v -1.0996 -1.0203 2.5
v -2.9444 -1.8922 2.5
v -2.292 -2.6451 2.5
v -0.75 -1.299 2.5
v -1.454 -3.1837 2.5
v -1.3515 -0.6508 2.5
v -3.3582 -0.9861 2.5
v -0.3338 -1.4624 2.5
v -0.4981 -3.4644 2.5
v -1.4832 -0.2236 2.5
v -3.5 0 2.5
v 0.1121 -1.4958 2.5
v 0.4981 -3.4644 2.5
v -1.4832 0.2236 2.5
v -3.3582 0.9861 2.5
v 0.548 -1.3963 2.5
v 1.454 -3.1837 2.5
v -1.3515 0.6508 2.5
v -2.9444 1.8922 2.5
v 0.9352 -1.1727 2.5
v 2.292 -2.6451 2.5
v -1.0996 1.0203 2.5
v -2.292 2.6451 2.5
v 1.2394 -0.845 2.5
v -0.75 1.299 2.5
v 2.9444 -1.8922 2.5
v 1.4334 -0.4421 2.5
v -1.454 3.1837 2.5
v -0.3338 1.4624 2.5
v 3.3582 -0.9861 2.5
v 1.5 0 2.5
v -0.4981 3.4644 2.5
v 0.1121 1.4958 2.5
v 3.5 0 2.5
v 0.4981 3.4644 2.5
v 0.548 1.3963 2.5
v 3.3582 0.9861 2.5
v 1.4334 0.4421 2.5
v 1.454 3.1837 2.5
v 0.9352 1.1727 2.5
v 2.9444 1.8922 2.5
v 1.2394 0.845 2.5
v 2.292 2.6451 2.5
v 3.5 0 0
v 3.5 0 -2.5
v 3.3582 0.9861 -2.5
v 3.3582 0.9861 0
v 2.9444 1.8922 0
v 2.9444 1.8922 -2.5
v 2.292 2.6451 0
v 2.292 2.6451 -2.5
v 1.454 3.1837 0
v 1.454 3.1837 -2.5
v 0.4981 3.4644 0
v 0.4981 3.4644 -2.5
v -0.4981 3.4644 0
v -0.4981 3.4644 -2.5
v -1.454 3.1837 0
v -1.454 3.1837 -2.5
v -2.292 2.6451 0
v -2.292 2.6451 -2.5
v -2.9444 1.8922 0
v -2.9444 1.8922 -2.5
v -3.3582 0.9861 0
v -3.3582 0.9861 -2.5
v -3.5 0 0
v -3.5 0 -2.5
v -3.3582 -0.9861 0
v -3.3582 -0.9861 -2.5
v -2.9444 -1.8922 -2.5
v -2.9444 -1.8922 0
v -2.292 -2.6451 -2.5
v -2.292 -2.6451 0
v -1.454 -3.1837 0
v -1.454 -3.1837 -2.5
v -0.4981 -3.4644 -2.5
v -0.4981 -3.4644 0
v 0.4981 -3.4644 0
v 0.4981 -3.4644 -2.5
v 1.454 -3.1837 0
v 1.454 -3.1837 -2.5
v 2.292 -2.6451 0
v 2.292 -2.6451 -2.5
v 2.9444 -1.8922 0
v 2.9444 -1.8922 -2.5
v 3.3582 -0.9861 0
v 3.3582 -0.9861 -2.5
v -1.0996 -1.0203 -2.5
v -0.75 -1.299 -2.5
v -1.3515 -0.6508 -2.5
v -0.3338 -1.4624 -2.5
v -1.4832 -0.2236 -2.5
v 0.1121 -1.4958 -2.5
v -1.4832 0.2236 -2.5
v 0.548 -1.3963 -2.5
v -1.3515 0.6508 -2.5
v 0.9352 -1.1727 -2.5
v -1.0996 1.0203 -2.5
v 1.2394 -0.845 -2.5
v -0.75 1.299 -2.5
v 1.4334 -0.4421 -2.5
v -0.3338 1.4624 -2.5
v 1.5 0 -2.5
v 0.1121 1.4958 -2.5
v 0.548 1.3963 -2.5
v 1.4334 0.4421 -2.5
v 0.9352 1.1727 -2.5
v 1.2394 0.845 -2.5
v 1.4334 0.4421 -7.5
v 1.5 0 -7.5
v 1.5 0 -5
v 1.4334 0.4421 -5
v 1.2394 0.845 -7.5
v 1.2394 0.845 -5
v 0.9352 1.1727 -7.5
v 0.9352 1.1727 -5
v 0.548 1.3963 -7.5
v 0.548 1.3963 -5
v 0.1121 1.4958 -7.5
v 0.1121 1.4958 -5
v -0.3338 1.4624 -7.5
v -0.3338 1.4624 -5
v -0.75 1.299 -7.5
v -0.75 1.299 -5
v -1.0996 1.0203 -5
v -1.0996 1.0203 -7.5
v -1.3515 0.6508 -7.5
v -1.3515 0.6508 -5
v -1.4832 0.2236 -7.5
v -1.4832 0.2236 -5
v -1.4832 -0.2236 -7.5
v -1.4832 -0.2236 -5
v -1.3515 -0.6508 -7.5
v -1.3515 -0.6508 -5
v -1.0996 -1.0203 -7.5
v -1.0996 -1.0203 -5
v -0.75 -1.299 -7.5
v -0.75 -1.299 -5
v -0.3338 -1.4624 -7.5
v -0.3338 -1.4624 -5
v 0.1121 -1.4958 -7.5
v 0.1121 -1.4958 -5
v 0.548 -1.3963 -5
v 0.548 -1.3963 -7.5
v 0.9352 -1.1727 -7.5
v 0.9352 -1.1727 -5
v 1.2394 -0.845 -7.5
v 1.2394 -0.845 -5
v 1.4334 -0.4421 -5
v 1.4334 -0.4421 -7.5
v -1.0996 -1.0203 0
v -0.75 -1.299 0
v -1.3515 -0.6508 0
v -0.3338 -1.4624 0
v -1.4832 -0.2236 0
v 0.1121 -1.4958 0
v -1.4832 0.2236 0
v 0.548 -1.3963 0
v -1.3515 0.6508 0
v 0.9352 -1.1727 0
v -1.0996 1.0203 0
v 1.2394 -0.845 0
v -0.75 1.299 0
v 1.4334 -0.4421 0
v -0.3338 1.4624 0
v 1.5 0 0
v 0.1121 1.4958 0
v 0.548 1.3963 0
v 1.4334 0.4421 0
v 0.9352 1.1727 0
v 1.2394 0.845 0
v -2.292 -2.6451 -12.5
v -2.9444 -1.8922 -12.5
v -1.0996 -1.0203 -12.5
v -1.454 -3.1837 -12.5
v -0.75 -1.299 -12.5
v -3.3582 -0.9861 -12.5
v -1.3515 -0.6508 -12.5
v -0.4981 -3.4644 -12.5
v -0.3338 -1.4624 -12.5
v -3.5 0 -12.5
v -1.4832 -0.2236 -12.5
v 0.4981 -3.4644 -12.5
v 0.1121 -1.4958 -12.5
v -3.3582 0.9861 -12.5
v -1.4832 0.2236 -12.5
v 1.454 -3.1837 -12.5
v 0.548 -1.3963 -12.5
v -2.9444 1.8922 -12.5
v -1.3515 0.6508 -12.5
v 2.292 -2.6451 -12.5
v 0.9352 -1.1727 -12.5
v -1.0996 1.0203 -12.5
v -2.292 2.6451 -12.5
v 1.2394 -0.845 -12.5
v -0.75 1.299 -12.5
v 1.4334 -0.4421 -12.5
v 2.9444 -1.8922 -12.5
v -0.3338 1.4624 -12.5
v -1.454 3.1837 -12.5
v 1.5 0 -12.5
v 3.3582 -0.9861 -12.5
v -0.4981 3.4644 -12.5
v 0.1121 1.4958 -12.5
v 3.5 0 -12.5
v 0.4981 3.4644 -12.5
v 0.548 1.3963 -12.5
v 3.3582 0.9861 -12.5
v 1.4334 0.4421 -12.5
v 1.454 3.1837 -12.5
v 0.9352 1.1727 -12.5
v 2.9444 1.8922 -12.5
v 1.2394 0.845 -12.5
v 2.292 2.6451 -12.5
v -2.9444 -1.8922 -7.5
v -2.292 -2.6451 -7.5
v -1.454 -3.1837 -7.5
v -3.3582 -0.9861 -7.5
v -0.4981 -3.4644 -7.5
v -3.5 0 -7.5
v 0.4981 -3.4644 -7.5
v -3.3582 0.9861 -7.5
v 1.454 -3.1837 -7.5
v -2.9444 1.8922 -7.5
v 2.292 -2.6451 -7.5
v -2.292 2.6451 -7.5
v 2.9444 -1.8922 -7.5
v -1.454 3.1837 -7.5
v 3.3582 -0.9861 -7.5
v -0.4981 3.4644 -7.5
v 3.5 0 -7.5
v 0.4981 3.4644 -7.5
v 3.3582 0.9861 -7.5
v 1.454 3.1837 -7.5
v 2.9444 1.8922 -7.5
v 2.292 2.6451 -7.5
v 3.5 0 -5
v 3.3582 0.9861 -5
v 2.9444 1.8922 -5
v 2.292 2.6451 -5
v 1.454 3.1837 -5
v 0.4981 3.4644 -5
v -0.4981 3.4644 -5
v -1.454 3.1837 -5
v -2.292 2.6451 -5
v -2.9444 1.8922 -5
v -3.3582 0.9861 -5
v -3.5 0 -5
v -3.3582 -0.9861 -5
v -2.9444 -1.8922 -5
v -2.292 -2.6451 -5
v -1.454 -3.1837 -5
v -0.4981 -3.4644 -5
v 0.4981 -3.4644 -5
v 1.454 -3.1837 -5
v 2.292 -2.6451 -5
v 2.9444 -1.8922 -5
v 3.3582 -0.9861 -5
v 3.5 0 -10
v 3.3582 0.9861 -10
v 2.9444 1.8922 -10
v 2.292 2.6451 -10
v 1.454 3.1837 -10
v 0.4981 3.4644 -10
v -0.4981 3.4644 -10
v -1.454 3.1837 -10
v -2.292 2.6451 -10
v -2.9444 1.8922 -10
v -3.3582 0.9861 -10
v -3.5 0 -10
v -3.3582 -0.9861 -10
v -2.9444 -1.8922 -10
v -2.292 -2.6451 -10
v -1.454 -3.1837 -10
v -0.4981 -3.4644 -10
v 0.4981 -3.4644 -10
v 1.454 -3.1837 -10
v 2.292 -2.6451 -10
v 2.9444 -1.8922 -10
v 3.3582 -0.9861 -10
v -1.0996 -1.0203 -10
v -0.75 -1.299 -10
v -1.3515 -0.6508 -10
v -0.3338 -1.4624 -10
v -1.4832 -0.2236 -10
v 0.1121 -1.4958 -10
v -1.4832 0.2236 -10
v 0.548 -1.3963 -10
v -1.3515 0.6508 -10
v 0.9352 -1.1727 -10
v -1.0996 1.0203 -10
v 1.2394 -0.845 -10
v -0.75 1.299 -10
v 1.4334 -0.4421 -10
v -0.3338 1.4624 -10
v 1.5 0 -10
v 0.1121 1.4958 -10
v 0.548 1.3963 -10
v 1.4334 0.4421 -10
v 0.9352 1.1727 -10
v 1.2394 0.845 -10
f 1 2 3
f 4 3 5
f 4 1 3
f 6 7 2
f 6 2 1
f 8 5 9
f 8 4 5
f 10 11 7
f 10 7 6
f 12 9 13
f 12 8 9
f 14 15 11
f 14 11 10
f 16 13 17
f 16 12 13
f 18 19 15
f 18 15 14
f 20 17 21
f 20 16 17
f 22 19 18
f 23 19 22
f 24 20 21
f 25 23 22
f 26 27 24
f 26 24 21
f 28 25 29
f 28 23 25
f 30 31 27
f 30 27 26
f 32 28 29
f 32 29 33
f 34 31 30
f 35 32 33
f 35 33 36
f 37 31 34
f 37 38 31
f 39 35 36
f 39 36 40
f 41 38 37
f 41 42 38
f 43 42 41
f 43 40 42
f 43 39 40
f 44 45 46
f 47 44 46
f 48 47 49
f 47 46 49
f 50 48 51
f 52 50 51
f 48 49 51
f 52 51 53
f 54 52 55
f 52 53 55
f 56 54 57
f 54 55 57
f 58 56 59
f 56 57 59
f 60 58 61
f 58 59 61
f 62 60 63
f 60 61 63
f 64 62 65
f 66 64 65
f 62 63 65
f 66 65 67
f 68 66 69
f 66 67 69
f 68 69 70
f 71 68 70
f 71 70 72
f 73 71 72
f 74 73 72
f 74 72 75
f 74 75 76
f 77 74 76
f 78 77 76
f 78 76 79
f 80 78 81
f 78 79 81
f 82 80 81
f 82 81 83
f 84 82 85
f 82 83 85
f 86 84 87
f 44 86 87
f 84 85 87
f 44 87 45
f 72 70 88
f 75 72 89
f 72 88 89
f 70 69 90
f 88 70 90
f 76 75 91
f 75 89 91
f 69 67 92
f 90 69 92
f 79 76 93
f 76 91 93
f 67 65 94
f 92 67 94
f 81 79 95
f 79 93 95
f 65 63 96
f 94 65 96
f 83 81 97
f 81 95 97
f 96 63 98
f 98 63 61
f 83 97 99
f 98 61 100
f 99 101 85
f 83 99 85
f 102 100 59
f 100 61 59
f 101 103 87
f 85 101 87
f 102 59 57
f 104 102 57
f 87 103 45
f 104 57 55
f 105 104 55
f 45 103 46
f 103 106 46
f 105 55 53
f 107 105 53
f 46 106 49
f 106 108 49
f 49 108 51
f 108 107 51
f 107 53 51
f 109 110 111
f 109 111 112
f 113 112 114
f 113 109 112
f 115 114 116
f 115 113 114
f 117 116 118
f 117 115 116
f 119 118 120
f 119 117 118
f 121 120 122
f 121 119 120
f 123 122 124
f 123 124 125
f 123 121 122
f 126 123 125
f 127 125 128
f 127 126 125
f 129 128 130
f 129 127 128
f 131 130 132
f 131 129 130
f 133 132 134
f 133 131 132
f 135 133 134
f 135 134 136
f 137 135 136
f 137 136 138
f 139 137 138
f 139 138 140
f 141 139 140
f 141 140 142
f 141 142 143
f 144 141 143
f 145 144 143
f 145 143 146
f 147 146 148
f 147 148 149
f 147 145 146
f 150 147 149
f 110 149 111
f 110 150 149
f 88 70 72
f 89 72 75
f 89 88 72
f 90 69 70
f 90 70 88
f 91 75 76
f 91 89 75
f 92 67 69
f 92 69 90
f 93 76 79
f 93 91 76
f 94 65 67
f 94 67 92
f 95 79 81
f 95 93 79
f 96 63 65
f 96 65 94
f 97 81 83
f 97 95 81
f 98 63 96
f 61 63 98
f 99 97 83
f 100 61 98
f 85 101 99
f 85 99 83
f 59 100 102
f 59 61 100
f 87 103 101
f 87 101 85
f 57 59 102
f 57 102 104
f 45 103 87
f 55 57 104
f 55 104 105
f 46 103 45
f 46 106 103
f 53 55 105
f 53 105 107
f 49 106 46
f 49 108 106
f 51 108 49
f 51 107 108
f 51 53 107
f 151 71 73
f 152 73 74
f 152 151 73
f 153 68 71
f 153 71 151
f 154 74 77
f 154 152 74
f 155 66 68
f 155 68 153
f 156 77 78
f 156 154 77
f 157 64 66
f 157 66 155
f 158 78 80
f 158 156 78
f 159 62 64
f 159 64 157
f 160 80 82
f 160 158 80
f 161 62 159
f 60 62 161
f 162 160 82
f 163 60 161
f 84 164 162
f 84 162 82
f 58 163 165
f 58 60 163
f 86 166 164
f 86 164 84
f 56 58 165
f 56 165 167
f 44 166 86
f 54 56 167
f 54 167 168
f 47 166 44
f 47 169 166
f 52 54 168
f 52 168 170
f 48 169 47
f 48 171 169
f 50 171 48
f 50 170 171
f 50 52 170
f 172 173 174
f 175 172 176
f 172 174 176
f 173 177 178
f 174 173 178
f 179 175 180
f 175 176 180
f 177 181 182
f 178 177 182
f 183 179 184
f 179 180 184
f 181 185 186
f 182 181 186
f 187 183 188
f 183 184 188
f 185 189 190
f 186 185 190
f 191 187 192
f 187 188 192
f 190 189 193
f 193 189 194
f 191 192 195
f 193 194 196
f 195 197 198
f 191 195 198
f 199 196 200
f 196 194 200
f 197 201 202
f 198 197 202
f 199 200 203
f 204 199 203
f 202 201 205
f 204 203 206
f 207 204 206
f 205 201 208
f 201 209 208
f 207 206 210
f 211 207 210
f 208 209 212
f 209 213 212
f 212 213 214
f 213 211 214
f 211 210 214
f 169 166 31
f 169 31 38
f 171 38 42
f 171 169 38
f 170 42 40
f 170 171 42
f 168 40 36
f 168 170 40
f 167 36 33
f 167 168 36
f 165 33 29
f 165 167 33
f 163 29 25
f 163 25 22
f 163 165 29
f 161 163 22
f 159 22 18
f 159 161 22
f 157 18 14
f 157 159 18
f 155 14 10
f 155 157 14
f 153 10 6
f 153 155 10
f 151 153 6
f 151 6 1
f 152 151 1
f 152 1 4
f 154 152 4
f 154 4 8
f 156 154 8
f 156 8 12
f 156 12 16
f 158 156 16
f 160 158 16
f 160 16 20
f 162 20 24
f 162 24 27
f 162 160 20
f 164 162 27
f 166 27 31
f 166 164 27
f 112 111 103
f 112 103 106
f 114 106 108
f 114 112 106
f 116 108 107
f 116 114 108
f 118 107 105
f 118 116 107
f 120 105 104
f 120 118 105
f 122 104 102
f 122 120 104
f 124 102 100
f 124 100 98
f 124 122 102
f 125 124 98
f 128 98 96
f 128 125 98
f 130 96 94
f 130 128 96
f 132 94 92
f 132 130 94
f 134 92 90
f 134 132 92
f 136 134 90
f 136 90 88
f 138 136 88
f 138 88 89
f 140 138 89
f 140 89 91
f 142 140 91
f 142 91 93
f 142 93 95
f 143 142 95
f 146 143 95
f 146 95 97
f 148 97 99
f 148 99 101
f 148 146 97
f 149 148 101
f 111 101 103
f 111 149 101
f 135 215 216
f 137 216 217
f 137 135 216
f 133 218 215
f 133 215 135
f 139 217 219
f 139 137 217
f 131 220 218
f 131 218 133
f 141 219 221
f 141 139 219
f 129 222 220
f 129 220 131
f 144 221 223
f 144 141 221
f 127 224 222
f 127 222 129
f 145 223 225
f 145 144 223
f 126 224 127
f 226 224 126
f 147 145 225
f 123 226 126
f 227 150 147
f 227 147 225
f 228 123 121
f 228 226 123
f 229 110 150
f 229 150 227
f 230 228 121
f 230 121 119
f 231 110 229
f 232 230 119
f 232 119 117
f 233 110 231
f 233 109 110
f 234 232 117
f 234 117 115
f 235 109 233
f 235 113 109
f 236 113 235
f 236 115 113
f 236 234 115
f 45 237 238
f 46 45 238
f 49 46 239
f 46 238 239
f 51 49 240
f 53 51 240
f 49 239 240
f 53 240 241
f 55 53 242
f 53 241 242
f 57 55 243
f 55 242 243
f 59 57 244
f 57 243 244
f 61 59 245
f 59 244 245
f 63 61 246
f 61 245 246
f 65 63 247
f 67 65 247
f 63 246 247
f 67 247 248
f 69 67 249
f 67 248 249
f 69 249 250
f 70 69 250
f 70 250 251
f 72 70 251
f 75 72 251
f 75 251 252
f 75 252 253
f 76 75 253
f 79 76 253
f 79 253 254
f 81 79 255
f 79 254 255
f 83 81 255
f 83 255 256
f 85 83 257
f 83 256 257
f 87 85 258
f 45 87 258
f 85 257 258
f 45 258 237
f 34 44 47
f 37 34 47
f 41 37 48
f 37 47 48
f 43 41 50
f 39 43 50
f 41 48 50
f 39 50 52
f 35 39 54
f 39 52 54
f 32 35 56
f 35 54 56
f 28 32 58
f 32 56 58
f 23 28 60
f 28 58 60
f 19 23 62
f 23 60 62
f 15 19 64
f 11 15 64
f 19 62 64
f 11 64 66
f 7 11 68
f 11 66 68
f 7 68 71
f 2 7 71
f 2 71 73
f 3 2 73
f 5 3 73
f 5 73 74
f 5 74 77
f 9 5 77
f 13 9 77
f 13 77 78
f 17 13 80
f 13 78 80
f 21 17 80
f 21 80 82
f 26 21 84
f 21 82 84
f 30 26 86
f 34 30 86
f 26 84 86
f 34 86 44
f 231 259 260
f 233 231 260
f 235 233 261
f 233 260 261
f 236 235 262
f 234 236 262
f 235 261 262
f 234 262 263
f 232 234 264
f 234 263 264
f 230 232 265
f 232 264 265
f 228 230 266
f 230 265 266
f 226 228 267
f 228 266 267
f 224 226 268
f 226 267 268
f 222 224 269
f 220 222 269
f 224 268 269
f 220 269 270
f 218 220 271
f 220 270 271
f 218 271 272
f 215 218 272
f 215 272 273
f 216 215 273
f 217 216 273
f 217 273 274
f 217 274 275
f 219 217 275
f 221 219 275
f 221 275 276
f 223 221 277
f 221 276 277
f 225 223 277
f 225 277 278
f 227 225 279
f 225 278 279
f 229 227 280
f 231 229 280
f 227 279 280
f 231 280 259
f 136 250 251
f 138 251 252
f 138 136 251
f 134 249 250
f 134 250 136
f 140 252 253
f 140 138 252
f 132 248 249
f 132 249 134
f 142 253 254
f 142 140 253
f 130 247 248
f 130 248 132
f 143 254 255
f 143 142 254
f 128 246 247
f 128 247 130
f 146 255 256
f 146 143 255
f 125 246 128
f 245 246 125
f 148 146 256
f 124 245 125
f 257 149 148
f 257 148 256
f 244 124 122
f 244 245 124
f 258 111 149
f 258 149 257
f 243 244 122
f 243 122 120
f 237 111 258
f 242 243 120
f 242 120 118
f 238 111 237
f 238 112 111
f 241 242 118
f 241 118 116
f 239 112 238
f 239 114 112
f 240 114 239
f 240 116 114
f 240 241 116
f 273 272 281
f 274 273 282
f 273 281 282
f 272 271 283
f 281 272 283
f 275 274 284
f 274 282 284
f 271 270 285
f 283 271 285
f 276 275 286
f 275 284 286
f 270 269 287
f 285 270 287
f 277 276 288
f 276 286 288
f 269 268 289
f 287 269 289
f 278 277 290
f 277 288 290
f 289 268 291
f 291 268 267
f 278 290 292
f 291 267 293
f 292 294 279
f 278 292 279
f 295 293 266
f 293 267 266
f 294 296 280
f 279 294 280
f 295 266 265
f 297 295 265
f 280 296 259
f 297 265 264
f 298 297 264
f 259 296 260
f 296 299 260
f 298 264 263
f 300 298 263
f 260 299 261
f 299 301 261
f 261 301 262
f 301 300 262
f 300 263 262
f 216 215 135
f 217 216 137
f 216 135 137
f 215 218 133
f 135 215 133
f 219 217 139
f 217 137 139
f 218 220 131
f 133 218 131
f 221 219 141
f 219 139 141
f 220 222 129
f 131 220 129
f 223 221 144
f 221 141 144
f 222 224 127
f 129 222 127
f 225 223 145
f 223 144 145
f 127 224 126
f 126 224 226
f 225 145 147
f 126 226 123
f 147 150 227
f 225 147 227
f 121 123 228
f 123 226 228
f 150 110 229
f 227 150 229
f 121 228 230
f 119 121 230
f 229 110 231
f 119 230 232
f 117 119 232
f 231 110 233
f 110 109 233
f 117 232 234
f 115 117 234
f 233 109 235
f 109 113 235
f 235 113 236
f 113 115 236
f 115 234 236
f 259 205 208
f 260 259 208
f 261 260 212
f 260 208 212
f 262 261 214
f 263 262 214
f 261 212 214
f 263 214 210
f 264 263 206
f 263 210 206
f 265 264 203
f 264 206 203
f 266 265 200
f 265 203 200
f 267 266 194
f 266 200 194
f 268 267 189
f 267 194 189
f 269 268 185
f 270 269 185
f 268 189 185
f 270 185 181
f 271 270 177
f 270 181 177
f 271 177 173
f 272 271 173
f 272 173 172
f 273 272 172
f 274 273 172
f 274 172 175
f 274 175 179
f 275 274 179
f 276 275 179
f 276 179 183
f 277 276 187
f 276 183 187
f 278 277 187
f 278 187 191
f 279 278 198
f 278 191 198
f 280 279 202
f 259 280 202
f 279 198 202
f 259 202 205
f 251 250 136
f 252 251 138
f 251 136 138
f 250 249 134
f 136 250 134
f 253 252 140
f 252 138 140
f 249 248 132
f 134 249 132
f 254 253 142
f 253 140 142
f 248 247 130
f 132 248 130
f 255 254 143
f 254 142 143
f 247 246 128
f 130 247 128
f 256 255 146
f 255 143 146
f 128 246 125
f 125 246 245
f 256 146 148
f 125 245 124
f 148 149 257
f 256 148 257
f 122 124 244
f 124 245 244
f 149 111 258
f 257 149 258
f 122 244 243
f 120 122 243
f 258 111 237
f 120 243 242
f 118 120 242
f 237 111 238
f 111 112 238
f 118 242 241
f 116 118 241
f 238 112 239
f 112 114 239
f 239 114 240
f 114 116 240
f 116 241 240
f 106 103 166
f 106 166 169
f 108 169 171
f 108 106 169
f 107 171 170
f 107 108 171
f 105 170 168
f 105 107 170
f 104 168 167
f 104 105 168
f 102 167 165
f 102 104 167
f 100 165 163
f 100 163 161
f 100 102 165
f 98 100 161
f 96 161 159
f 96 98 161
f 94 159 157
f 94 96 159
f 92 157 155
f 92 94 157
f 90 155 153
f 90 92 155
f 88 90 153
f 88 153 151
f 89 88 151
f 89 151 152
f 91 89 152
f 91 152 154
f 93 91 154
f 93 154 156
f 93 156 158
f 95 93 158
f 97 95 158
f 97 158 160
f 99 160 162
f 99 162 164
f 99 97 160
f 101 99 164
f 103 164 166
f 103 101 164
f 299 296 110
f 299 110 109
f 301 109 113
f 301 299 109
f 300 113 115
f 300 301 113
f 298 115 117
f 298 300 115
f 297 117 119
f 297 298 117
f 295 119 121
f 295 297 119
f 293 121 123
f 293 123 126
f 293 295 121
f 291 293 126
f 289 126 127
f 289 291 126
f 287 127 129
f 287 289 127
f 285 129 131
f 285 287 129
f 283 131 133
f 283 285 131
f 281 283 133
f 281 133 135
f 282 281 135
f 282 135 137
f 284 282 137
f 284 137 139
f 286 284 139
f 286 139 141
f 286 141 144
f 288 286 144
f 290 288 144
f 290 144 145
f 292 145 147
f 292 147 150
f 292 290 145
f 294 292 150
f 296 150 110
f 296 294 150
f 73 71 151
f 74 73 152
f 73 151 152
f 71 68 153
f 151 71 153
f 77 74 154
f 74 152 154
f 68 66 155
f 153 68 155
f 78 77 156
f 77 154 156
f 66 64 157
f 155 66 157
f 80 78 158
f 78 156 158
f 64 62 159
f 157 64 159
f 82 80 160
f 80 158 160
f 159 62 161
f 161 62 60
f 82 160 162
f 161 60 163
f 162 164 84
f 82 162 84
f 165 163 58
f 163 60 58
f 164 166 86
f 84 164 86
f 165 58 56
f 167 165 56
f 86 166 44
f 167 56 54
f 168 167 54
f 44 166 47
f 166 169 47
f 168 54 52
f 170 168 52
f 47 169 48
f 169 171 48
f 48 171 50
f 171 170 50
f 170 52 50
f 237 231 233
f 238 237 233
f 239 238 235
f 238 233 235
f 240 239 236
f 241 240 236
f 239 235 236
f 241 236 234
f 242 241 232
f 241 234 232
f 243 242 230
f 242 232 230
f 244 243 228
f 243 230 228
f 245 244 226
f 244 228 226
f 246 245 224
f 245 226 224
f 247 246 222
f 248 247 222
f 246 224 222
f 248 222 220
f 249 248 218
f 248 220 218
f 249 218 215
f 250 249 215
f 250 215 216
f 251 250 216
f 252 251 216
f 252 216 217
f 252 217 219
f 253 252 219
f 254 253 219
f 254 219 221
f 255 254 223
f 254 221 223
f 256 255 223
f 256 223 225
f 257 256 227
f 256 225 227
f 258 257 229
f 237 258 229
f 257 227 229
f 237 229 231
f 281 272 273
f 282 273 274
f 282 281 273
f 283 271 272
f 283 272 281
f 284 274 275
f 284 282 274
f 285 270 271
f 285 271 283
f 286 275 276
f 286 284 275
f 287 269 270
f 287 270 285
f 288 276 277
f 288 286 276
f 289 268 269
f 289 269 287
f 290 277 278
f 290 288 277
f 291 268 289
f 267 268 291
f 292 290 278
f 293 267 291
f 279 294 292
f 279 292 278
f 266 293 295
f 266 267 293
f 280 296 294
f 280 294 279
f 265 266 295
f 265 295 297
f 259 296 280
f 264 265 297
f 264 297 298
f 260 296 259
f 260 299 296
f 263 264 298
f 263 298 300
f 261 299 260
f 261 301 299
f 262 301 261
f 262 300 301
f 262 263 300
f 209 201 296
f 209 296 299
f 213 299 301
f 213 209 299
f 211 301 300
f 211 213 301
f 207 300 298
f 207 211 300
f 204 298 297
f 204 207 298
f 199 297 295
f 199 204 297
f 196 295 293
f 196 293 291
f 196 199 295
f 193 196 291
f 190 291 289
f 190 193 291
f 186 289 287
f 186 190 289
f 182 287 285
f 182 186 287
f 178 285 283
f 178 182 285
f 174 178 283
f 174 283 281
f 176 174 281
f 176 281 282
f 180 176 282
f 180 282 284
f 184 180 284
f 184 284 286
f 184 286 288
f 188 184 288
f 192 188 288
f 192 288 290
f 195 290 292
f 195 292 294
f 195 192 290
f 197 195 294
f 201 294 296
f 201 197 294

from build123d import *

# Parameters (mm, degrees)
SKETCH_1_R             = 3.5
SKETCH_1_R_2           = 1.5
EXTRUDE_1_DEPTH        = 2.5
PATTERN_LINEAR_1_COUNT = 6
PATTERN_LINEAR_1_PITCH = 2.5


with BuildPart() as part:
    # 草图1 → 凸台-拉伸1 (new body)
    with BuildSketch(Plane.XY):
        Circle(SKETCH_1_R)
        Circle(SKETCH_1_R_2, mode=Mode.SUBTRACT)
    extrude(amount=EXTRUDE_1_DEPTH)


with BuildPart() as pattern_linear_1_1:
    # 阵列(线性)1: pattern copy
    add(part.part.moved(Location(Vector(0, 0, -1) * (1 * PATTERN_LINEAR_1_PITCH))))


with BuildPart() as pattern_linear_1_2:
    # 阵列(线性)1: pattern copy
    add(part.part.moved(Location(Vector(0, 0, -1) * (2 * PATTERN_LINEAR_1_PITCH))))


with BuildPart() as pattern_linear_1_3:
    # 阵列(线性)1: pattern copy
    add(part.part.moved(Location(Vector(0, 0, -1) * (3 * PATTERN_LINEAR_1_PITCH))))


with BuildPart() as pattern_linear_1_4:
    # 阵列(线性)1: pattern copy
    add(part.part.moved(Location(Vector(0, 0, -1) * (4 * PATTERN_LINEAR_1_PITCH))))


with BuildPart() as pattern_linear_1_5:
    # 阵列(线性)1: pattern copy
    add(part.part.moved(Location(Vector(0, 0, -1) * (5 * PATTERN_LINEAR_1_PITCH))))


solid = Compound([part.part, pattern_linear_1_1.part, pattern_linear_1_2.part, pattern_linear_1_3.part, pattern_linear_1_4.part, pattern_linear_1_5.part])
